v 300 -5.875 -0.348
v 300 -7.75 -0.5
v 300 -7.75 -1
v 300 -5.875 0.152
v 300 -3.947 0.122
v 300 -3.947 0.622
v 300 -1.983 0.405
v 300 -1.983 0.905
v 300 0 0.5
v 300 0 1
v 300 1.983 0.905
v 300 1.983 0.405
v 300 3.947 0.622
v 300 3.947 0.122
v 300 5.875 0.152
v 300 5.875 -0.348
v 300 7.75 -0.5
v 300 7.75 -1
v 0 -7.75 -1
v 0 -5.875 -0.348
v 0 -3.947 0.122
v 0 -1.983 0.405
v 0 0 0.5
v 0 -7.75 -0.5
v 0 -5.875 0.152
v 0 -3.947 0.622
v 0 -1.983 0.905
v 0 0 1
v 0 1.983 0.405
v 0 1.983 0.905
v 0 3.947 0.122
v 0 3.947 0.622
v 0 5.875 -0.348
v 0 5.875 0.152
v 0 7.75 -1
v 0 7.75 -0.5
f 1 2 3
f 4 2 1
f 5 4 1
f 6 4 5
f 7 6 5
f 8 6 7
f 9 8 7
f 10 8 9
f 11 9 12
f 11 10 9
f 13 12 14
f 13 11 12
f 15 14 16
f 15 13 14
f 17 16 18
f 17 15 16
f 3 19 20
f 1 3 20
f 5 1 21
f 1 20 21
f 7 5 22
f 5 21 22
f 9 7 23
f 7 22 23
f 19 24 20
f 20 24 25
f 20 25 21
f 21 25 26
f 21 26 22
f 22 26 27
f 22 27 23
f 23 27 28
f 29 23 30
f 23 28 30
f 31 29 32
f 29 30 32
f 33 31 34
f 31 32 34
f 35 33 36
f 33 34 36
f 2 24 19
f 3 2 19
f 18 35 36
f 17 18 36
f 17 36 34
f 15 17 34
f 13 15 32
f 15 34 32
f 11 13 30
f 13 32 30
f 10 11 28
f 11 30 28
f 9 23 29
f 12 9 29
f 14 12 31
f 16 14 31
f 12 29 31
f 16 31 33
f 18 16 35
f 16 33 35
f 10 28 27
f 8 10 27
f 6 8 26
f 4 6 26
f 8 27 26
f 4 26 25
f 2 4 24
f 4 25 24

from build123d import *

# Parameters (mm, degrees)
F1_DEPTH = 300


with BuildPart() as f1:
    # F0 (on Right) → F1 (new body)
    with BuildSketch(Plane.YZ):
        with BuildLine():
            ThreePointArc((0, 0.5), (3.946913, 0.121552), (7.75, -1))
            Line((7.75, -1), (7.75, -0.5))
            ThreePointArc((7.75, -0.5), (3.946913, 0.621552), (0, 1))
            Line((0, 1), (0, 0.5))
        make_face()
        with BuildLine():
            ThreePointArc((-7.75, -1), (-3.946913, 0.121552), (0, 0.5))
            Line((0, 0.5), (0, 1))
            ThreePointArc((0, 1), (-3.946913, 0.621552), (-7.75, -0.5))
            Line((-7.75, -0.5), (-7.75, -1))
        make_face()
    extrude(amount=F1_DEPTH)


solid = f1.part
